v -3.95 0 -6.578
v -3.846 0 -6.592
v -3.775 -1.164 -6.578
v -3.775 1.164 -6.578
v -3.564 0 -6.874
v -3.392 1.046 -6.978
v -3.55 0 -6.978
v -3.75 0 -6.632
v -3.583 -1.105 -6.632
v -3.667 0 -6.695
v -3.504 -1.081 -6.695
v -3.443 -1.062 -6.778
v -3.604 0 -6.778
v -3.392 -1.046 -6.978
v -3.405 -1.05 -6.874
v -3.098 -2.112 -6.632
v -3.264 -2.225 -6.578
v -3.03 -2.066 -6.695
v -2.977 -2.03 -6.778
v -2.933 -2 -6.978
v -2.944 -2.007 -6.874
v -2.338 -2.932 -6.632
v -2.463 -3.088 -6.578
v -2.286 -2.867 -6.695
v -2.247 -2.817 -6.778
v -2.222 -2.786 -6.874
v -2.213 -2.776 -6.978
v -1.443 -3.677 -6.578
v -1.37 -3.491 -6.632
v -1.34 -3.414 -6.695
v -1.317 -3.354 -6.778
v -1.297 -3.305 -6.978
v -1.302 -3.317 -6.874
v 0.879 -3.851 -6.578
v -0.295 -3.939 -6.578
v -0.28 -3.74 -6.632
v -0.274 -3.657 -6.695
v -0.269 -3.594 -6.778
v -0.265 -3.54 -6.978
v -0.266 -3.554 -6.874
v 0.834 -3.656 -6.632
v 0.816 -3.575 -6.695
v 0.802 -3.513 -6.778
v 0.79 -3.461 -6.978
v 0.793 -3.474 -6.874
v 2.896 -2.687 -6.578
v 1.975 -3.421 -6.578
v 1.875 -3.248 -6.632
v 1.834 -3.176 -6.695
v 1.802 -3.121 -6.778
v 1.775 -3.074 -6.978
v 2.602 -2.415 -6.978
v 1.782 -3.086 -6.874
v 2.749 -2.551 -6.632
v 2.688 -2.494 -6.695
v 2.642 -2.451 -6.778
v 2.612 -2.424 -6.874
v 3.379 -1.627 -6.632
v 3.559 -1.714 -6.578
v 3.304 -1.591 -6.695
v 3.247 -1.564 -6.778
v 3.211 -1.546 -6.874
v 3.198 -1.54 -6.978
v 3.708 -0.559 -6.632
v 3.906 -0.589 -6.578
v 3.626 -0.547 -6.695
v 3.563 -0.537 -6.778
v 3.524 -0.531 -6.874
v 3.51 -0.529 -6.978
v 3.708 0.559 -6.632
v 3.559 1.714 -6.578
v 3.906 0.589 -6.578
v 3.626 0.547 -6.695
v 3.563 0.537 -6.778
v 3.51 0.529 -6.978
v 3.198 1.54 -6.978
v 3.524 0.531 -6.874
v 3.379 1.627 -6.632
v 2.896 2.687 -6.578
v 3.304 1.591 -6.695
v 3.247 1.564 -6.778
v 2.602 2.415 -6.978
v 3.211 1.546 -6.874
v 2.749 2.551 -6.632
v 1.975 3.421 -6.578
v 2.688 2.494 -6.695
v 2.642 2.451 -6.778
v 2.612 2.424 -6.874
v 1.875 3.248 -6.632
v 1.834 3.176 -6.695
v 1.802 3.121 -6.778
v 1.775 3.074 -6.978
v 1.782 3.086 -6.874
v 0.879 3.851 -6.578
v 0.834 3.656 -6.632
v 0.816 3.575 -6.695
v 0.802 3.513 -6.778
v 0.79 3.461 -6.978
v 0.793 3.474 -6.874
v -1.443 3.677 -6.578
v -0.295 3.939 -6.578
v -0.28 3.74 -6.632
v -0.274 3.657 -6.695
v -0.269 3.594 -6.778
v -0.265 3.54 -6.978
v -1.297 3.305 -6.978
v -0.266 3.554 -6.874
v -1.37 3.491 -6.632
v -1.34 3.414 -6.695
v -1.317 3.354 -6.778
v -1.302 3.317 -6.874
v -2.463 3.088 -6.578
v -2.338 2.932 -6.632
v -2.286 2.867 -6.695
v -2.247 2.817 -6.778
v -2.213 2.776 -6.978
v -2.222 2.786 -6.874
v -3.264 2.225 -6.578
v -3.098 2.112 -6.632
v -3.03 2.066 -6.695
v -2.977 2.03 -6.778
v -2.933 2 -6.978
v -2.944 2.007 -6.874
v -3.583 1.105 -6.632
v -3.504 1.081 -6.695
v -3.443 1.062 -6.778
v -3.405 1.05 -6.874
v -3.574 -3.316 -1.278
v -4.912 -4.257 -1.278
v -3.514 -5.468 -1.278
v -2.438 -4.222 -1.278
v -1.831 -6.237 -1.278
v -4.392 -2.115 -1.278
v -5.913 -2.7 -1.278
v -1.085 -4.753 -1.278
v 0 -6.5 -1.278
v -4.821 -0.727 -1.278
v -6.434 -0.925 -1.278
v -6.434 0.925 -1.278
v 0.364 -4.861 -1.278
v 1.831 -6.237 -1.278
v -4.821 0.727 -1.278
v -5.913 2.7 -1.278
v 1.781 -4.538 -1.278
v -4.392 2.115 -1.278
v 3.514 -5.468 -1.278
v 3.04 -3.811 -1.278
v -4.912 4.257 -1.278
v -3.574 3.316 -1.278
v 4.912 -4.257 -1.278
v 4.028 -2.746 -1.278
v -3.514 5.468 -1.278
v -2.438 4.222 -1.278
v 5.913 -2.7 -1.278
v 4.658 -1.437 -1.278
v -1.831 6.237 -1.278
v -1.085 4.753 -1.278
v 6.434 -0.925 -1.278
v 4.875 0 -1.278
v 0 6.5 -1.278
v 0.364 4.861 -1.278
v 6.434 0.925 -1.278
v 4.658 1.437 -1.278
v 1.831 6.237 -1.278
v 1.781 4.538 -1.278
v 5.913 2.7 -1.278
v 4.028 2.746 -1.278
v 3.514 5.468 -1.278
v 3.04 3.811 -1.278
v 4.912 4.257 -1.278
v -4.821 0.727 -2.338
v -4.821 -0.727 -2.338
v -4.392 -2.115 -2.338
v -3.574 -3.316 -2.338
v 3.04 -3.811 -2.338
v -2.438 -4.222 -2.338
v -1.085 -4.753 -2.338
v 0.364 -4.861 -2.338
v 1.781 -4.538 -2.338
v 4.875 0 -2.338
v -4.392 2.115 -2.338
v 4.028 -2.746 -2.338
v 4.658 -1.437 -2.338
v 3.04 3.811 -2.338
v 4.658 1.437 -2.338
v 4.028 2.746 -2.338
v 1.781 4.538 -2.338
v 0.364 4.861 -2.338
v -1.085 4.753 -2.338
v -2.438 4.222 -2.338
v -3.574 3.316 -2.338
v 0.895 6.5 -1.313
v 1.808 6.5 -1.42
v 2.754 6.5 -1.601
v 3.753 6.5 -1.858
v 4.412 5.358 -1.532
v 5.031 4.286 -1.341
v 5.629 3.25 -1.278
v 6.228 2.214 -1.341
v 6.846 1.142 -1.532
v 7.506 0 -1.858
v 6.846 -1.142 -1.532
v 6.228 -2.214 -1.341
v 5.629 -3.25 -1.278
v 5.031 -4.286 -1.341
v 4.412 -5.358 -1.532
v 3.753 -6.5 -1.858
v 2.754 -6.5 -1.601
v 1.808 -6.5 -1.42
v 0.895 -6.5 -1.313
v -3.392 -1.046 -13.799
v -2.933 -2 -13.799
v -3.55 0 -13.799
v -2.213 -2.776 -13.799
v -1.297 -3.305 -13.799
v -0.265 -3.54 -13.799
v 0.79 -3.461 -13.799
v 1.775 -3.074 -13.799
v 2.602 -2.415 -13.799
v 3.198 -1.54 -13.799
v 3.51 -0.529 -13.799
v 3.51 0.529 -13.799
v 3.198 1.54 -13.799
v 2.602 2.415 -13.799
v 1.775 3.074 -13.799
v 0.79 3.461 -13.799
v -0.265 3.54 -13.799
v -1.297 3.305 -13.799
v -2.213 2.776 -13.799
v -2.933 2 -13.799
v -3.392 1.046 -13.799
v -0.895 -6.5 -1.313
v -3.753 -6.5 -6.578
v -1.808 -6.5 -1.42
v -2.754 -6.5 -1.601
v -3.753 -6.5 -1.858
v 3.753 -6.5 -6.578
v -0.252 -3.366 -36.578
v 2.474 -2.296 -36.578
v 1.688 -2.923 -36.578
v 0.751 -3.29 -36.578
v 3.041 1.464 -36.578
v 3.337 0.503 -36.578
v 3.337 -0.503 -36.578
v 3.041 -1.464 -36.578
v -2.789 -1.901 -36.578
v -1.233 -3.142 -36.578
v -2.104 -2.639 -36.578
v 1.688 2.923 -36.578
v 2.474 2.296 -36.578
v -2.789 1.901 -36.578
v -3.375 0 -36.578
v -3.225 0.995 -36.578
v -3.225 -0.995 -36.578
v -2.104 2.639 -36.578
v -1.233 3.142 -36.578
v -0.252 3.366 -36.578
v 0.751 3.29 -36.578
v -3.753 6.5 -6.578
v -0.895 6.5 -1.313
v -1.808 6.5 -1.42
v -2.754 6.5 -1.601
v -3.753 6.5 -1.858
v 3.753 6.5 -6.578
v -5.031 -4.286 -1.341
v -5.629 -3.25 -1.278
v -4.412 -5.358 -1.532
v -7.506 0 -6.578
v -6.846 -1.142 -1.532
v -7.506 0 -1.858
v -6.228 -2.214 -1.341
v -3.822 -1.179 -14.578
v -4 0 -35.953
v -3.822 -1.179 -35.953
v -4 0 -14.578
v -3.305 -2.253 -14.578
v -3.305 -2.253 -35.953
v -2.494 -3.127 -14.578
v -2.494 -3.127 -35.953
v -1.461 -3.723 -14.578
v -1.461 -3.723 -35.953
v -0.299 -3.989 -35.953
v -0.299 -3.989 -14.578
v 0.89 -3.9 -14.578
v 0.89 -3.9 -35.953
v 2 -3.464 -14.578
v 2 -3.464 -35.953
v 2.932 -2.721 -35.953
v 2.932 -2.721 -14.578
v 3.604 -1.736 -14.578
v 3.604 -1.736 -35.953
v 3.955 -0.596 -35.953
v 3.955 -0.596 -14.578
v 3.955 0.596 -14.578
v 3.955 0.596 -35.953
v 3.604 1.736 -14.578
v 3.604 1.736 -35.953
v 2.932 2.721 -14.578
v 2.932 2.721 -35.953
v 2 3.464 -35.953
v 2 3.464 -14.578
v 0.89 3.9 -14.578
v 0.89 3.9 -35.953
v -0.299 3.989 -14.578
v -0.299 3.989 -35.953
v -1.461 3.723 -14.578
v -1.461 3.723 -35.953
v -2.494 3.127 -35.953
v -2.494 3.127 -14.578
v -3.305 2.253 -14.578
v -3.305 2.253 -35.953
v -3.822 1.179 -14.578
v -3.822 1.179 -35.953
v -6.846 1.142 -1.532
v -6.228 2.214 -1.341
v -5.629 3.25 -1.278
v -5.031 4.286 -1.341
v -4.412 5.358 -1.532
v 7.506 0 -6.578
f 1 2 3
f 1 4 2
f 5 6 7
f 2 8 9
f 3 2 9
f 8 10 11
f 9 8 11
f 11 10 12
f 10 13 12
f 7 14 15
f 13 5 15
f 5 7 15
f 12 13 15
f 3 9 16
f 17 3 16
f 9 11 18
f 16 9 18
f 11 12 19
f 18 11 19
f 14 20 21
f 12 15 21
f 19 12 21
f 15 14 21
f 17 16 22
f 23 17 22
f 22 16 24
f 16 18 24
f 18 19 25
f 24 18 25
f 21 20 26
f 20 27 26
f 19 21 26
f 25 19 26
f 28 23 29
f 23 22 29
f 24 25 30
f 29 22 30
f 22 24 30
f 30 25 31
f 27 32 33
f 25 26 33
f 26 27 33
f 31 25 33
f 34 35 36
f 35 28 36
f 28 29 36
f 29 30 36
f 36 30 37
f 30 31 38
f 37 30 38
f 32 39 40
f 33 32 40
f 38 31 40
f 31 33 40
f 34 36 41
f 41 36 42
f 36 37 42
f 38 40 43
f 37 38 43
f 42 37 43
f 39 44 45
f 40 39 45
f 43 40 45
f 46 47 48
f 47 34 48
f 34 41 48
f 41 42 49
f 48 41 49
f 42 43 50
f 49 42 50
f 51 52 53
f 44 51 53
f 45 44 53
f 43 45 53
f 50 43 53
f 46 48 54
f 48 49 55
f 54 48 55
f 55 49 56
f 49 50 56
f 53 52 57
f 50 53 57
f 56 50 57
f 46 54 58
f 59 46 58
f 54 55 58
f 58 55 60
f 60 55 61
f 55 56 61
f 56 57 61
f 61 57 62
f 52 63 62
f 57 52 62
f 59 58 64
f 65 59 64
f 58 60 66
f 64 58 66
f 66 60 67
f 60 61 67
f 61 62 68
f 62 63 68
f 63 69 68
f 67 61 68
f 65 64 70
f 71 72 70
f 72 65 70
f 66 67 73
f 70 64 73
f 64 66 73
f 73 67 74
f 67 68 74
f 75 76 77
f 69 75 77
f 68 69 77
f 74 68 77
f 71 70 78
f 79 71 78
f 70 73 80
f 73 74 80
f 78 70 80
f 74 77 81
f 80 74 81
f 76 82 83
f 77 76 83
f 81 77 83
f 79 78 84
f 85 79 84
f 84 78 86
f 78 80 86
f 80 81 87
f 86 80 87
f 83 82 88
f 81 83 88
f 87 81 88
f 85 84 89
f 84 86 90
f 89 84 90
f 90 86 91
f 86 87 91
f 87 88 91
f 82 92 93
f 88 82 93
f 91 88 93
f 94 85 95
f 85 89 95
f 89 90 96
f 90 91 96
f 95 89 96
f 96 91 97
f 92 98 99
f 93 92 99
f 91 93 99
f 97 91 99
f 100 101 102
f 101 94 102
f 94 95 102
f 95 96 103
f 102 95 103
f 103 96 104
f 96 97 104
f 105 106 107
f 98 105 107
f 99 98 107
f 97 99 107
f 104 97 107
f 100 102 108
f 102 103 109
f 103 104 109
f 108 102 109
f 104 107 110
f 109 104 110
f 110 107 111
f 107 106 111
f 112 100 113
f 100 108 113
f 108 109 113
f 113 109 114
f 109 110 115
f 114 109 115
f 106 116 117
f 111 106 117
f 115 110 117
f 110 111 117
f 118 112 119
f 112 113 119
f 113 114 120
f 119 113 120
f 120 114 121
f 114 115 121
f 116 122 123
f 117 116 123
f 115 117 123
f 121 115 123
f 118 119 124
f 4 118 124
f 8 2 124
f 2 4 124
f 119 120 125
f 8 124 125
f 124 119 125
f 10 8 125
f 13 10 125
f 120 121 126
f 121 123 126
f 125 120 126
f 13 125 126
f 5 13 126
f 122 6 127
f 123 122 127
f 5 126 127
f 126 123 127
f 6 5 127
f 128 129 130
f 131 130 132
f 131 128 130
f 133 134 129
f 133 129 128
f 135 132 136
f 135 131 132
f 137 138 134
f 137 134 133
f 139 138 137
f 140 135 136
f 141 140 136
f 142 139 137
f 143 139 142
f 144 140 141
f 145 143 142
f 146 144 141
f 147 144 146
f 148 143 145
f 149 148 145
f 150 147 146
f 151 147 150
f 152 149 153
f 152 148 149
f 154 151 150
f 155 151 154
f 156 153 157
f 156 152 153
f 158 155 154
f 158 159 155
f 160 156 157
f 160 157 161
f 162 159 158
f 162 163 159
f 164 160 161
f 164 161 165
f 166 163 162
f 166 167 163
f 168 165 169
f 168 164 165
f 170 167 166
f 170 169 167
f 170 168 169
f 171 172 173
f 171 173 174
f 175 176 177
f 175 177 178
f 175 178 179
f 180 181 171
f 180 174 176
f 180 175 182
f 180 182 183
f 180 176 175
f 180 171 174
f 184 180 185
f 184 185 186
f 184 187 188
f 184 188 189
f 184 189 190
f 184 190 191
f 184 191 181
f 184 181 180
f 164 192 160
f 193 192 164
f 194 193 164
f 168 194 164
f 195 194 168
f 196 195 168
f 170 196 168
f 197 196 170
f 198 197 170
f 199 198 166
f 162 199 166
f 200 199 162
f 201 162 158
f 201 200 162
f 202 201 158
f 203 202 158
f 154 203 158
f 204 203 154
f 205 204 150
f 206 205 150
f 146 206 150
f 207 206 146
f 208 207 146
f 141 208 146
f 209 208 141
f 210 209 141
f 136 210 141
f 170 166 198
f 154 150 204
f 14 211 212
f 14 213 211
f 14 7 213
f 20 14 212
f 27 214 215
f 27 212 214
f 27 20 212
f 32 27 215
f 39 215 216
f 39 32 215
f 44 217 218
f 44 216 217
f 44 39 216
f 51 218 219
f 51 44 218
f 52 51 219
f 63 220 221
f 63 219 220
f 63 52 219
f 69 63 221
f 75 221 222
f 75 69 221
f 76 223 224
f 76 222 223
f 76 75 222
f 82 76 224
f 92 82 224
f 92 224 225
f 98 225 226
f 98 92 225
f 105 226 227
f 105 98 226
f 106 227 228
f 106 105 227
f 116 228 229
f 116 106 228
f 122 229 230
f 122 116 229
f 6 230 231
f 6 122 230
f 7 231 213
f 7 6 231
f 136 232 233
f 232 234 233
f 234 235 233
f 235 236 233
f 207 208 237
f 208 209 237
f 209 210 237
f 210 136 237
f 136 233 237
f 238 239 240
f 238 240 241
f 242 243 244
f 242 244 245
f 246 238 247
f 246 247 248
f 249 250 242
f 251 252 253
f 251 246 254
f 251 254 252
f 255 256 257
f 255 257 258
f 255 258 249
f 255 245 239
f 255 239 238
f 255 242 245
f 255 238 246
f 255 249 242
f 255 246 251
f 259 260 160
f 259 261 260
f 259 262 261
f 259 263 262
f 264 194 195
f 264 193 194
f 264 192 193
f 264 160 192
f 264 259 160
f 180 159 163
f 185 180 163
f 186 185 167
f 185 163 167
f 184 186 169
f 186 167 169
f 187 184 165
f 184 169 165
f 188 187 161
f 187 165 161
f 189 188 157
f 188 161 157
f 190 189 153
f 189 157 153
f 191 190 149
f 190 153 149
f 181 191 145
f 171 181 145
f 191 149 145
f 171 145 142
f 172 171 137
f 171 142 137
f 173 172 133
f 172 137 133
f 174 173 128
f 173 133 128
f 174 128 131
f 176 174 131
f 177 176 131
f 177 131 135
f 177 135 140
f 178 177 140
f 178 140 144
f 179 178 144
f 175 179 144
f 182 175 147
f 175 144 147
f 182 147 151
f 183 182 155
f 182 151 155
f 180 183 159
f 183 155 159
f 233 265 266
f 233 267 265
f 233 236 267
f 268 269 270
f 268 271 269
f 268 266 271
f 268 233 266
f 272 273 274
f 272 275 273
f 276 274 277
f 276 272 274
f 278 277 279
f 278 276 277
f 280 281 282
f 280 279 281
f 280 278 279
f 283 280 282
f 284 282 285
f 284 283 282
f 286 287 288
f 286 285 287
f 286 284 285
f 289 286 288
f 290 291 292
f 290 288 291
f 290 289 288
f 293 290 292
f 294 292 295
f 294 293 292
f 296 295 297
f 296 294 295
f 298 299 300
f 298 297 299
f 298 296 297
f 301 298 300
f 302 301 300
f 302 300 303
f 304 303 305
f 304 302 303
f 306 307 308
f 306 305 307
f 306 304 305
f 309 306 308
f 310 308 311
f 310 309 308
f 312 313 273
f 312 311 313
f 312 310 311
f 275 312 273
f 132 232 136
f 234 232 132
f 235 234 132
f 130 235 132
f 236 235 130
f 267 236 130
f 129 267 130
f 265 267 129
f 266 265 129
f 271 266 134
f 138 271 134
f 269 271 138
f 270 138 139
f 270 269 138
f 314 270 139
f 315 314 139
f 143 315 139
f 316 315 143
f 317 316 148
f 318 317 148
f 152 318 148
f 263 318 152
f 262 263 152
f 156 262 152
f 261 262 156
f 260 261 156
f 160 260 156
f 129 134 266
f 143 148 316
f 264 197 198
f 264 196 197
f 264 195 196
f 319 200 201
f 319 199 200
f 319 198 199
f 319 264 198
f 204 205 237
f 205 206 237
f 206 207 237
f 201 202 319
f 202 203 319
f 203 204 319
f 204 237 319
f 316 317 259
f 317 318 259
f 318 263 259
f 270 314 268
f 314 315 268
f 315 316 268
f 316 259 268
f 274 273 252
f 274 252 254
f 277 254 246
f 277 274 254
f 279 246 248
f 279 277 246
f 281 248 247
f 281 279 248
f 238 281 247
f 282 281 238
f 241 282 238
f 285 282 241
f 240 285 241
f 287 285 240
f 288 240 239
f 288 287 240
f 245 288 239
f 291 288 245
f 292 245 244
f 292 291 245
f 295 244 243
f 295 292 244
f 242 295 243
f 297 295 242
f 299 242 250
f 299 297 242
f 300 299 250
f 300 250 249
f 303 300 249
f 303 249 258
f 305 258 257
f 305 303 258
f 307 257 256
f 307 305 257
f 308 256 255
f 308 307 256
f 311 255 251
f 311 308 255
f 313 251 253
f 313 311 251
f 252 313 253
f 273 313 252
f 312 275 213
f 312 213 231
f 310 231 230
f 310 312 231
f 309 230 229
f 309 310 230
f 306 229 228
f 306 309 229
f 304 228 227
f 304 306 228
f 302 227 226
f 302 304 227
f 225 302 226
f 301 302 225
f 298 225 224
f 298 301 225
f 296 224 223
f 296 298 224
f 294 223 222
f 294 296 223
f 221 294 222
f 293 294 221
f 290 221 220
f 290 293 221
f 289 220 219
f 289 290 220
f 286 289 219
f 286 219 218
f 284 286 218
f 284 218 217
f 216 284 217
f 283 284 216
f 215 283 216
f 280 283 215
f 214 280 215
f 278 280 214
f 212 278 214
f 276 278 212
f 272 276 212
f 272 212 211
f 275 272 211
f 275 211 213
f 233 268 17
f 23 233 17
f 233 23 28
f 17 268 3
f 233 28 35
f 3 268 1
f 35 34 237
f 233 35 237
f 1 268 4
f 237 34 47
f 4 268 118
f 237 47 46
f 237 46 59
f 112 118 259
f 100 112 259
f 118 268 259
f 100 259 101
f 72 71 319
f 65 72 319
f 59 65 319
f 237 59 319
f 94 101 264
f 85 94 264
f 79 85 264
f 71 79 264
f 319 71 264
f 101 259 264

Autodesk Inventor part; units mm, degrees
ref_plane "YZ Plane" through (0, 0, 0) normal (1, 0, 0) x (0, 1, 0)
sketch "Sketch2" plane through (0, 0, 0) normal (0, 1, 0) x (-1, 0, 0)
  line L0 (0, -6.578) -> (0, -36.578)
  line L1 (0, -36.578) -> (3.375, -36.578)
  line L2 (4, -35.953) -> (4, -14.578)
  line L3 (4, -14.578) -> (3.55, -13.7986)
  line L4 (3.55, -13.7986) -> (3.55, -6.578)
  line L5 (3.55, -6.578) -> (0, -6.578)
  line L6 (3.375, -36.578) -> (4, -35.953)
  line L7 (4, -36.578) -> (4, -37.4619)
  line L8 (0, -43.6386) -> (0, -0.4012) projected
  dimension "Ds" = 7.1
  dimension "NND" = 8
  dimension "b" = 22
  dimension "d3" = 30
  dimension "d5" = 45
  dimension "PTC" = 1.25
  dimension "NLG" = 30
revolve "Revolution1" add sketch "Sketch2" angle 360 about axis through (0, 0, -6.578) along (0, 0, -1)
sketch "Sketch3" plane through (0, 0, -6.578) normal (0, 0, 1) x (1, 0, 0)
  circle A0 centre (0, 0) radius 3.55 projected
  line L0 (0, 6.5) -> (3.7528, 6.5)
  line L1 (3.7528, 6.5) -> (7.5056, 0)
  line L2 (7.5056, 0) -> (0, 0)
  line L3 (0, 0) -> (0, 6.5)
  line L4 (0, 6.5) -> (-3.7528, 6.5)
  line L5 (-3.7528, 6.5) -> (-7.5056, 0)
  line L6 (0, -6.5) -> (3.7528, -6.5)
  line L7 (3.7528, -6.5) -> (7.5056, 0)
  line L8 (-3.7528, -6.5) -> (-7.5056, 0)
  line L9 (0, -6.5) -> (-3.7528, -6.5)
  dimension "d9" = 60
  dimension "ParS" = 13
  dimension "msp_d11" = 13
extrude "Extrusion1" add sketch "Sketch3" along normal blind 5.3
sketch "Sketch4" plane through (0, 0, 0) normal (0, 1, 0) x (-1, 0, 0)
  line L0 (-6.5, -1.278) -> (-7.5056, -1.278)
  line L1 (-7.5056, -1.278) -> (-7.5056, -1.8585)
  line L2 (-7.5056, -1.8585) -> (-6.5, -1.278)
  line L3 (0, -13.4454) -> (0, 34.6268) projected
  line L4 (0, 27.7593) -> (0, 27.1787)
  line L5 (-7.5056, -6.578) -> (-7.5056, -1.278) projected
  line L6 (-3.7528, -1.278) -> (-7.5056, -1.278) projected
  dimension "d14" = 30
  dimension "msp_d15" = 13
revolve "Revolution2" cut sketch "Sketch4" angle 360 about axis through (0, 0, 27.7593) along (0, 0, -1)
sketch "Sketch5" plane through (0, 0, -1.278) normal (0, 0, 1) x (1, 0, 0)
  arc A0 (5.6292, 3.25) -> (0, 6.5) centre (0, 0) ccw projected
  circle A1 centre (0, 0) radius 4.875
  dimension "d27" = 9.75
extrude "Extrusion2" cut sketch "Sketch5" against normal blind 1.06
thread "Thread1" size "M8x1.25" class "6g" standard "ISO Metric profile" full length
ref_plane "MSC_PF1" through (0, 0, 0) normal (0, 1, 0) x (-1, 0, 0)
ref_plane "MSC_PT1" through (0, 0, -6.578) normal (0, 0, -1) x (-1, 0, 0)
fillet "Fillet1" radius 0.4 1 edges at (3.55, 0, -6.578)
equation "\"msp_d11\" = ParS"
equation "\"msp_d15\" = ParS"
equation "\"d27\" = 0.75 * ParS"
equation "\"d28\" = 0.2 * ParK"
equation "\"d30\" = r"
equation "\"msp_d17\" = b"
equation "\"r\" = 0.4"
equation "\"THREADDIA\" = NND"
equation "\"ParK\" = 5.3"
properties part number "ISO 4015 - M8 x 30" material "Stainless Steel, 440C"
